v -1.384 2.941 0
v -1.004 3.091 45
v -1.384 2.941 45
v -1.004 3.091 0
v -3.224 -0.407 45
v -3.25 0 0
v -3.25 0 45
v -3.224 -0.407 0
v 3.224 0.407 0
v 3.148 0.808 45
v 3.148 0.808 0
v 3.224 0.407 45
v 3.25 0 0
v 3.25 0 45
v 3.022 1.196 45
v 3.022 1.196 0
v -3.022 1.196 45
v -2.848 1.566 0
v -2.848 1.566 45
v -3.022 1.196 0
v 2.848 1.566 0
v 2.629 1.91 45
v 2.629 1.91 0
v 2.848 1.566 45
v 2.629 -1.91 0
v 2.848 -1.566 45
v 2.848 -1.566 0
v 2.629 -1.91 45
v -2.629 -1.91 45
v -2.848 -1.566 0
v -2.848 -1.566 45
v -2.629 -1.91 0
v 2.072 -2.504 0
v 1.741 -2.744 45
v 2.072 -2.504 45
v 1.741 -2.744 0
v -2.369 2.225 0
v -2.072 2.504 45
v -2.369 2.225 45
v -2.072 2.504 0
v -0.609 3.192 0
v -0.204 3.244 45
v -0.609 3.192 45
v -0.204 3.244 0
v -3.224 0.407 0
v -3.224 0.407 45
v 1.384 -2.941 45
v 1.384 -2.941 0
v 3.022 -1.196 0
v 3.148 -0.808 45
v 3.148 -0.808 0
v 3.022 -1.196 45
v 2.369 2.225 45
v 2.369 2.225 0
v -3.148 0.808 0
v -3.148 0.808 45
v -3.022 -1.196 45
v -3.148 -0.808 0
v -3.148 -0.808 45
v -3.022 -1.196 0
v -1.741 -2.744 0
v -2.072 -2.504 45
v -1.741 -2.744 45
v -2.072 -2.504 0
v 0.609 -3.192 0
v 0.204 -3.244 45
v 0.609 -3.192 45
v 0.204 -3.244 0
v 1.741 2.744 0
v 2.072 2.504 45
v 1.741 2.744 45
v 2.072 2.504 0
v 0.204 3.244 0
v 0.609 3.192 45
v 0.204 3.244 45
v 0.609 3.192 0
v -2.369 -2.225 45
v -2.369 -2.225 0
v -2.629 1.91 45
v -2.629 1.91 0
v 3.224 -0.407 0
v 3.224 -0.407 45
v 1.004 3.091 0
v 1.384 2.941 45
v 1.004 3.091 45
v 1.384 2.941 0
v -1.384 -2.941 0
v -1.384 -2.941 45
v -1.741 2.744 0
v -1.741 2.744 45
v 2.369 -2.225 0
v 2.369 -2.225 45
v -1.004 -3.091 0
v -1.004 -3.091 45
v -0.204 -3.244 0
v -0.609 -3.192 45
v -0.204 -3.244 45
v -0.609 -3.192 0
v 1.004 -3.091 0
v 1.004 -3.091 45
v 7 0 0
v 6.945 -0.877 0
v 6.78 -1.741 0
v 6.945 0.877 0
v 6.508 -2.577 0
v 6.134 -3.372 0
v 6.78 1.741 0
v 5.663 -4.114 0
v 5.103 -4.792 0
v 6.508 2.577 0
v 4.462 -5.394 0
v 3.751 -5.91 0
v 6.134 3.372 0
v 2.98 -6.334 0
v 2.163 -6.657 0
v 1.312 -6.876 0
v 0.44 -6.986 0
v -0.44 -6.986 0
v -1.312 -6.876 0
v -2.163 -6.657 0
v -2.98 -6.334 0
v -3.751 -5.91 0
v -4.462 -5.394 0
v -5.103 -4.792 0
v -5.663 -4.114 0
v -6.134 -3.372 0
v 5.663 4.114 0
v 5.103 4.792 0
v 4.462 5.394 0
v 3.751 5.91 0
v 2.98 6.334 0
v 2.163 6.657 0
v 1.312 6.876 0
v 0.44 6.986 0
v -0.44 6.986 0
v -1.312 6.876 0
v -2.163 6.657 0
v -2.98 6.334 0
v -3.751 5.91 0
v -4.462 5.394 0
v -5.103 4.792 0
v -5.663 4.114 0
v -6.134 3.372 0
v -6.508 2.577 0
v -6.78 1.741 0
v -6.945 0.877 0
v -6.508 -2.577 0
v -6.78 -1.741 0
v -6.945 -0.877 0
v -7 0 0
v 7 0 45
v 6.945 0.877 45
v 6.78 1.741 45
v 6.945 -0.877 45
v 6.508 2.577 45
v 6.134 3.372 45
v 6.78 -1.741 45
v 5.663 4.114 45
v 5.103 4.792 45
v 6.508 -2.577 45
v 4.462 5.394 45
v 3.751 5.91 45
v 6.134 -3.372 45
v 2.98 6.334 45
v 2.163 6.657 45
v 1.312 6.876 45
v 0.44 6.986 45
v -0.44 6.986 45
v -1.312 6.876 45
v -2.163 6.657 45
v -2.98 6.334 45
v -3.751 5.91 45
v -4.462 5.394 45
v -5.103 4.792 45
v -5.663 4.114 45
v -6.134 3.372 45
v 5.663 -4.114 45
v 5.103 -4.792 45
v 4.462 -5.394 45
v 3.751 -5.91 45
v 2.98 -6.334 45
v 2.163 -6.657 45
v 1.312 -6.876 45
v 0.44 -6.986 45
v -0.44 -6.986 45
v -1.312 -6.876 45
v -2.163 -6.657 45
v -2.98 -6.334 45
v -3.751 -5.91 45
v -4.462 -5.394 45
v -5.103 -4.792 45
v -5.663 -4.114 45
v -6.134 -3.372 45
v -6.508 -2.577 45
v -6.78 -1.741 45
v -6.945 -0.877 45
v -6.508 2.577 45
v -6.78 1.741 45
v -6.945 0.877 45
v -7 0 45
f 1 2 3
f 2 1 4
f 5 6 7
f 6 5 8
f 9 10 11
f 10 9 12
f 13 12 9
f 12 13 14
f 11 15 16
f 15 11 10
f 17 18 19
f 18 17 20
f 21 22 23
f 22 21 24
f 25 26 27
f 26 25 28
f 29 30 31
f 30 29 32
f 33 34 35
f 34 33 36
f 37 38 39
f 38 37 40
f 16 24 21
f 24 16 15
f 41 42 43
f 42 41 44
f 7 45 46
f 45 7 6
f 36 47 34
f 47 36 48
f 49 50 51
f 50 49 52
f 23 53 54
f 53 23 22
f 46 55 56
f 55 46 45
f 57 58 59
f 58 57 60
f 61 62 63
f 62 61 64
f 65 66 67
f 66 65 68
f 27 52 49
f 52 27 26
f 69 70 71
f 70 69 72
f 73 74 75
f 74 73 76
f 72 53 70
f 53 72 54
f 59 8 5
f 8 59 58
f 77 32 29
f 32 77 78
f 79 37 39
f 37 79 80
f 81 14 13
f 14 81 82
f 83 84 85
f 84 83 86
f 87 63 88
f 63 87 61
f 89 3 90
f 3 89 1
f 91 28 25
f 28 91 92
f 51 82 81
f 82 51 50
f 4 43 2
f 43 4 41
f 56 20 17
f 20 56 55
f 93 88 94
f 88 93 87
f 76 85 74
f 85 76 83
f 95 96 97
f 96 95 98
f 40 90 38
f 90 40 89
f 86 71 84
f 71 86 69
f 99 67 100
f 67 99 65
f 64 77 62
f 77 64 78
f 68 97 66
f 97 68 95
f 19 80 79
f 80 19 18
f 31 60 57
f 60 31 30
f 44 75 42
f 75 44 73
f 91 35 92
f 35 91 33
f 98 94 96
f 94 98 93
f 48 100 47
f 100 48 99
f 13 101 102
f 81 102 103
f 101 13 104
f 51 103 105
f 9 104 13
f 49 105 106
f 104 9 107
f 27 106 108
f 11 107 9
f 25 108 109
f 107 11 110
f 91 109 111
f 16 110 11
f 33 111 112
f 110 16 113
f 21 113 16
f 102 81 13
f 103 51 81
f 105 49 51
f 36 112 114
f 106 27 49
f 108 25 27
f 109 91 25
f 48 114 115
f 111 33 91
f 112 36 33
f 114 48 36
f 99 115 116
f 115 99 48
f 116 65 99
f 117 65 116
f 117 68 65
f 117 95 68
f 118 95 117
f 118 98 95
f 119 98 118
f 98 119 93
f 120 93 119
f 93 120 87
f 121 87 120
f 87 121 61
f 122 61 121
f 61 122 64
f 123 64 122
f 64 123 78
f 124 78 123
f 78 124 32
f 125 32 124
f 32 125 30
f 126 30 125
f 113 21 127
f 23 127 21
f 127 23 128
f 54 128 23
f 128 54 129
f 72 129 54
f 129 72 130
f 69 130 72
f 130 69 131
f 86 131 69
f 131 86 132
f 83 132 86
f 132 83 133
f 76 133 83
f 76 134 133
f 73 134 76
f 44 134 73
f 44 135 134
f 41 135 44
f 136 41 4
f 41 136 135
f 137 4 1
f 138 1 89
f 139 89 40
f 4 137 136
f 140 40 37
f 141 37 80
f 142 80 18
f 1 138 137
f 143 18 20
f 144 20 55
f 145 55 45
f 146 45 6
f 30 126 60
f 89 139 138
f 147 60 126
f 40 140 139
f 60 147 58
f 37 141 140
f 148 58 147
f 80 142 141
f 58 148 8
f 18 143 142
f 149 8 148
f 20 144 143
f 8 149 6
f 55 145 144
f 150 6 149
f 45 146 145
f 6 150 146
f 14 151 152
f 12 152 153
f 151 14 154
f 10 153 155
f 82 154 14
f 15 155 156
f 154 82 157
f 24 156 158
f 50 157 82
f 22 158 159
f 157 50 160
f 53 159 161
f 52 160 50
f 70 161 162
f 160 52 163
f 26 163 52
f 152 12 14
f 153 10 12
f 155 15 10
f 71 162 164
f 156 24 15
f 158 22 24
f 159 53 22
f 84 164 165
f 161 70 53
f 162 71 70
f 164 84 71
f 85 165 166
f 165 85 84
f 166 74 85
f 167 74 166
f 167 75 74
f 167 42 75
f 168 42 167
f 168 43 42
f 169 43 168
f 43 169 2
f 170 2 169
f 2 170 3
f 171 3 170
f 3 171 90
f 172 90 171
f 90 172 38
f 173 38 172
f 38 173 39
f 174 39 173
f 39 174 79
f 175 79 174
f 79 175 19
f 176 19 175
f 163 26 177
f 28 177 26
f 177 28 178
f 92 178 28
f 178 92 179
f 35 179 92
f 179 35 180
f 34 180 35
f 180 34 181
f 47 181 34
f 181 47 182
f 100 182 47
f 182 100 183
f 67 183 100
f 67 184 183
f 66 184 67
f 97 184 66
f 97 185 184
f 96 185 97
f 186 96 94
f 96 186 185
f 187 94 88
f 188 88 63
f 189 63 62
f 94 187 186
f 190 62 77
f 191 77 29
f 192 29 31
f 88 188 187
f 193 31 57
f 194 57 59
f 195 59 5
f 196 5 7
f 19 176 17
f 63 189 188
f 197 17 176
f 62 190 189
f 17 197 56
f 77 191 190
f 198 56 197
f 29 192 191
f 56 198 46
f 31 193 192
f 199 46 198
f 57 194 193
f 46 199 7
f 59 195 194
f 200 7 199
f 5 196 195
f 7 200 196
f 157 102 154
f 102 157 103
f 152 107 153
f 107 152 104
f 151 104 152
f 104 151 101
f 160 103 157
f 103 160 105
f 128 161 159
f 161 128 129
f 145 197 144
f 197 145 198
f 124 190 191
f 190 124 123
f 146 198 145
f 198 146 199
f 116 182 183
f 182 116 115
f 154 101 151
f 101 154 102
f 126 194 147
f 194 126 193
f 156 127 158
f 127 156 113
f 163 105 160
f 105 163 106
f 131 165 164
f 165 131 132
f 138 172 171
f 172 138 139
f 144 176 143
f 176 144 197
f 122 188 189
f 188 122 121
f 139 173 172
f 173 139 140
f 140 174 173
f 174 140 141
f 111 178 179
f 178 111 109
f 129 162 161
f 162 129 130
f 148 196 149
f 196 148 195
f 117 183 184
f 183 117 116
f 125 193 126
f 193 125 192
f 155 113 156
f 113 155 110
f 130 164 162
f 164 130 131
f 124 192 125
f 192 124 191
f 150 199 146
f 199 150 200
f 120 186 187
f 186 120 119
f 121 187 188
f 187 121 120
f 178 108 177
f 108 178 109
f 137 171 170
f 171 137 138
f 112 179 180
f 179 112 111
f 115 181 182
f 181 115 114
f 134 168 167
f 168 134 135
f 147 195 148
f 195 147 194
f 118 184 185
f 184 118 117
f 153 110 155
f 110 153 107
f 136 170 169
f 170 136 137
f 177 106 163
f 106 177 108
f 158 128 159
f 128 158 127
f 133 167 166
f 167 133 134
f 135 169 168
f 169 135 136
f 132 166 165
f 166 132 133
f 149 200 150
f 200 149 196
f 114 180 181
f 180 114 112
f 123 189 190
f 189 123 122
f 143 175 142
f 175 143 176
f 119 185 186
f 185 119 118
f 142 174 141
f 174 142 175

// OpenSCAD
$fn = 50;


difference() {
	union() {
		cylinder(h = 45, r = 7.0000000000);
	}
	union() {
		cylinder(h = 45, r = 3.2500000000);
		cylinder(h = 45, r = 1.8000000000);
		cylinder(h = 45, r = 1.8000000000);
		cylinder(h = 45, r = 1.8000000000);
	}
}
